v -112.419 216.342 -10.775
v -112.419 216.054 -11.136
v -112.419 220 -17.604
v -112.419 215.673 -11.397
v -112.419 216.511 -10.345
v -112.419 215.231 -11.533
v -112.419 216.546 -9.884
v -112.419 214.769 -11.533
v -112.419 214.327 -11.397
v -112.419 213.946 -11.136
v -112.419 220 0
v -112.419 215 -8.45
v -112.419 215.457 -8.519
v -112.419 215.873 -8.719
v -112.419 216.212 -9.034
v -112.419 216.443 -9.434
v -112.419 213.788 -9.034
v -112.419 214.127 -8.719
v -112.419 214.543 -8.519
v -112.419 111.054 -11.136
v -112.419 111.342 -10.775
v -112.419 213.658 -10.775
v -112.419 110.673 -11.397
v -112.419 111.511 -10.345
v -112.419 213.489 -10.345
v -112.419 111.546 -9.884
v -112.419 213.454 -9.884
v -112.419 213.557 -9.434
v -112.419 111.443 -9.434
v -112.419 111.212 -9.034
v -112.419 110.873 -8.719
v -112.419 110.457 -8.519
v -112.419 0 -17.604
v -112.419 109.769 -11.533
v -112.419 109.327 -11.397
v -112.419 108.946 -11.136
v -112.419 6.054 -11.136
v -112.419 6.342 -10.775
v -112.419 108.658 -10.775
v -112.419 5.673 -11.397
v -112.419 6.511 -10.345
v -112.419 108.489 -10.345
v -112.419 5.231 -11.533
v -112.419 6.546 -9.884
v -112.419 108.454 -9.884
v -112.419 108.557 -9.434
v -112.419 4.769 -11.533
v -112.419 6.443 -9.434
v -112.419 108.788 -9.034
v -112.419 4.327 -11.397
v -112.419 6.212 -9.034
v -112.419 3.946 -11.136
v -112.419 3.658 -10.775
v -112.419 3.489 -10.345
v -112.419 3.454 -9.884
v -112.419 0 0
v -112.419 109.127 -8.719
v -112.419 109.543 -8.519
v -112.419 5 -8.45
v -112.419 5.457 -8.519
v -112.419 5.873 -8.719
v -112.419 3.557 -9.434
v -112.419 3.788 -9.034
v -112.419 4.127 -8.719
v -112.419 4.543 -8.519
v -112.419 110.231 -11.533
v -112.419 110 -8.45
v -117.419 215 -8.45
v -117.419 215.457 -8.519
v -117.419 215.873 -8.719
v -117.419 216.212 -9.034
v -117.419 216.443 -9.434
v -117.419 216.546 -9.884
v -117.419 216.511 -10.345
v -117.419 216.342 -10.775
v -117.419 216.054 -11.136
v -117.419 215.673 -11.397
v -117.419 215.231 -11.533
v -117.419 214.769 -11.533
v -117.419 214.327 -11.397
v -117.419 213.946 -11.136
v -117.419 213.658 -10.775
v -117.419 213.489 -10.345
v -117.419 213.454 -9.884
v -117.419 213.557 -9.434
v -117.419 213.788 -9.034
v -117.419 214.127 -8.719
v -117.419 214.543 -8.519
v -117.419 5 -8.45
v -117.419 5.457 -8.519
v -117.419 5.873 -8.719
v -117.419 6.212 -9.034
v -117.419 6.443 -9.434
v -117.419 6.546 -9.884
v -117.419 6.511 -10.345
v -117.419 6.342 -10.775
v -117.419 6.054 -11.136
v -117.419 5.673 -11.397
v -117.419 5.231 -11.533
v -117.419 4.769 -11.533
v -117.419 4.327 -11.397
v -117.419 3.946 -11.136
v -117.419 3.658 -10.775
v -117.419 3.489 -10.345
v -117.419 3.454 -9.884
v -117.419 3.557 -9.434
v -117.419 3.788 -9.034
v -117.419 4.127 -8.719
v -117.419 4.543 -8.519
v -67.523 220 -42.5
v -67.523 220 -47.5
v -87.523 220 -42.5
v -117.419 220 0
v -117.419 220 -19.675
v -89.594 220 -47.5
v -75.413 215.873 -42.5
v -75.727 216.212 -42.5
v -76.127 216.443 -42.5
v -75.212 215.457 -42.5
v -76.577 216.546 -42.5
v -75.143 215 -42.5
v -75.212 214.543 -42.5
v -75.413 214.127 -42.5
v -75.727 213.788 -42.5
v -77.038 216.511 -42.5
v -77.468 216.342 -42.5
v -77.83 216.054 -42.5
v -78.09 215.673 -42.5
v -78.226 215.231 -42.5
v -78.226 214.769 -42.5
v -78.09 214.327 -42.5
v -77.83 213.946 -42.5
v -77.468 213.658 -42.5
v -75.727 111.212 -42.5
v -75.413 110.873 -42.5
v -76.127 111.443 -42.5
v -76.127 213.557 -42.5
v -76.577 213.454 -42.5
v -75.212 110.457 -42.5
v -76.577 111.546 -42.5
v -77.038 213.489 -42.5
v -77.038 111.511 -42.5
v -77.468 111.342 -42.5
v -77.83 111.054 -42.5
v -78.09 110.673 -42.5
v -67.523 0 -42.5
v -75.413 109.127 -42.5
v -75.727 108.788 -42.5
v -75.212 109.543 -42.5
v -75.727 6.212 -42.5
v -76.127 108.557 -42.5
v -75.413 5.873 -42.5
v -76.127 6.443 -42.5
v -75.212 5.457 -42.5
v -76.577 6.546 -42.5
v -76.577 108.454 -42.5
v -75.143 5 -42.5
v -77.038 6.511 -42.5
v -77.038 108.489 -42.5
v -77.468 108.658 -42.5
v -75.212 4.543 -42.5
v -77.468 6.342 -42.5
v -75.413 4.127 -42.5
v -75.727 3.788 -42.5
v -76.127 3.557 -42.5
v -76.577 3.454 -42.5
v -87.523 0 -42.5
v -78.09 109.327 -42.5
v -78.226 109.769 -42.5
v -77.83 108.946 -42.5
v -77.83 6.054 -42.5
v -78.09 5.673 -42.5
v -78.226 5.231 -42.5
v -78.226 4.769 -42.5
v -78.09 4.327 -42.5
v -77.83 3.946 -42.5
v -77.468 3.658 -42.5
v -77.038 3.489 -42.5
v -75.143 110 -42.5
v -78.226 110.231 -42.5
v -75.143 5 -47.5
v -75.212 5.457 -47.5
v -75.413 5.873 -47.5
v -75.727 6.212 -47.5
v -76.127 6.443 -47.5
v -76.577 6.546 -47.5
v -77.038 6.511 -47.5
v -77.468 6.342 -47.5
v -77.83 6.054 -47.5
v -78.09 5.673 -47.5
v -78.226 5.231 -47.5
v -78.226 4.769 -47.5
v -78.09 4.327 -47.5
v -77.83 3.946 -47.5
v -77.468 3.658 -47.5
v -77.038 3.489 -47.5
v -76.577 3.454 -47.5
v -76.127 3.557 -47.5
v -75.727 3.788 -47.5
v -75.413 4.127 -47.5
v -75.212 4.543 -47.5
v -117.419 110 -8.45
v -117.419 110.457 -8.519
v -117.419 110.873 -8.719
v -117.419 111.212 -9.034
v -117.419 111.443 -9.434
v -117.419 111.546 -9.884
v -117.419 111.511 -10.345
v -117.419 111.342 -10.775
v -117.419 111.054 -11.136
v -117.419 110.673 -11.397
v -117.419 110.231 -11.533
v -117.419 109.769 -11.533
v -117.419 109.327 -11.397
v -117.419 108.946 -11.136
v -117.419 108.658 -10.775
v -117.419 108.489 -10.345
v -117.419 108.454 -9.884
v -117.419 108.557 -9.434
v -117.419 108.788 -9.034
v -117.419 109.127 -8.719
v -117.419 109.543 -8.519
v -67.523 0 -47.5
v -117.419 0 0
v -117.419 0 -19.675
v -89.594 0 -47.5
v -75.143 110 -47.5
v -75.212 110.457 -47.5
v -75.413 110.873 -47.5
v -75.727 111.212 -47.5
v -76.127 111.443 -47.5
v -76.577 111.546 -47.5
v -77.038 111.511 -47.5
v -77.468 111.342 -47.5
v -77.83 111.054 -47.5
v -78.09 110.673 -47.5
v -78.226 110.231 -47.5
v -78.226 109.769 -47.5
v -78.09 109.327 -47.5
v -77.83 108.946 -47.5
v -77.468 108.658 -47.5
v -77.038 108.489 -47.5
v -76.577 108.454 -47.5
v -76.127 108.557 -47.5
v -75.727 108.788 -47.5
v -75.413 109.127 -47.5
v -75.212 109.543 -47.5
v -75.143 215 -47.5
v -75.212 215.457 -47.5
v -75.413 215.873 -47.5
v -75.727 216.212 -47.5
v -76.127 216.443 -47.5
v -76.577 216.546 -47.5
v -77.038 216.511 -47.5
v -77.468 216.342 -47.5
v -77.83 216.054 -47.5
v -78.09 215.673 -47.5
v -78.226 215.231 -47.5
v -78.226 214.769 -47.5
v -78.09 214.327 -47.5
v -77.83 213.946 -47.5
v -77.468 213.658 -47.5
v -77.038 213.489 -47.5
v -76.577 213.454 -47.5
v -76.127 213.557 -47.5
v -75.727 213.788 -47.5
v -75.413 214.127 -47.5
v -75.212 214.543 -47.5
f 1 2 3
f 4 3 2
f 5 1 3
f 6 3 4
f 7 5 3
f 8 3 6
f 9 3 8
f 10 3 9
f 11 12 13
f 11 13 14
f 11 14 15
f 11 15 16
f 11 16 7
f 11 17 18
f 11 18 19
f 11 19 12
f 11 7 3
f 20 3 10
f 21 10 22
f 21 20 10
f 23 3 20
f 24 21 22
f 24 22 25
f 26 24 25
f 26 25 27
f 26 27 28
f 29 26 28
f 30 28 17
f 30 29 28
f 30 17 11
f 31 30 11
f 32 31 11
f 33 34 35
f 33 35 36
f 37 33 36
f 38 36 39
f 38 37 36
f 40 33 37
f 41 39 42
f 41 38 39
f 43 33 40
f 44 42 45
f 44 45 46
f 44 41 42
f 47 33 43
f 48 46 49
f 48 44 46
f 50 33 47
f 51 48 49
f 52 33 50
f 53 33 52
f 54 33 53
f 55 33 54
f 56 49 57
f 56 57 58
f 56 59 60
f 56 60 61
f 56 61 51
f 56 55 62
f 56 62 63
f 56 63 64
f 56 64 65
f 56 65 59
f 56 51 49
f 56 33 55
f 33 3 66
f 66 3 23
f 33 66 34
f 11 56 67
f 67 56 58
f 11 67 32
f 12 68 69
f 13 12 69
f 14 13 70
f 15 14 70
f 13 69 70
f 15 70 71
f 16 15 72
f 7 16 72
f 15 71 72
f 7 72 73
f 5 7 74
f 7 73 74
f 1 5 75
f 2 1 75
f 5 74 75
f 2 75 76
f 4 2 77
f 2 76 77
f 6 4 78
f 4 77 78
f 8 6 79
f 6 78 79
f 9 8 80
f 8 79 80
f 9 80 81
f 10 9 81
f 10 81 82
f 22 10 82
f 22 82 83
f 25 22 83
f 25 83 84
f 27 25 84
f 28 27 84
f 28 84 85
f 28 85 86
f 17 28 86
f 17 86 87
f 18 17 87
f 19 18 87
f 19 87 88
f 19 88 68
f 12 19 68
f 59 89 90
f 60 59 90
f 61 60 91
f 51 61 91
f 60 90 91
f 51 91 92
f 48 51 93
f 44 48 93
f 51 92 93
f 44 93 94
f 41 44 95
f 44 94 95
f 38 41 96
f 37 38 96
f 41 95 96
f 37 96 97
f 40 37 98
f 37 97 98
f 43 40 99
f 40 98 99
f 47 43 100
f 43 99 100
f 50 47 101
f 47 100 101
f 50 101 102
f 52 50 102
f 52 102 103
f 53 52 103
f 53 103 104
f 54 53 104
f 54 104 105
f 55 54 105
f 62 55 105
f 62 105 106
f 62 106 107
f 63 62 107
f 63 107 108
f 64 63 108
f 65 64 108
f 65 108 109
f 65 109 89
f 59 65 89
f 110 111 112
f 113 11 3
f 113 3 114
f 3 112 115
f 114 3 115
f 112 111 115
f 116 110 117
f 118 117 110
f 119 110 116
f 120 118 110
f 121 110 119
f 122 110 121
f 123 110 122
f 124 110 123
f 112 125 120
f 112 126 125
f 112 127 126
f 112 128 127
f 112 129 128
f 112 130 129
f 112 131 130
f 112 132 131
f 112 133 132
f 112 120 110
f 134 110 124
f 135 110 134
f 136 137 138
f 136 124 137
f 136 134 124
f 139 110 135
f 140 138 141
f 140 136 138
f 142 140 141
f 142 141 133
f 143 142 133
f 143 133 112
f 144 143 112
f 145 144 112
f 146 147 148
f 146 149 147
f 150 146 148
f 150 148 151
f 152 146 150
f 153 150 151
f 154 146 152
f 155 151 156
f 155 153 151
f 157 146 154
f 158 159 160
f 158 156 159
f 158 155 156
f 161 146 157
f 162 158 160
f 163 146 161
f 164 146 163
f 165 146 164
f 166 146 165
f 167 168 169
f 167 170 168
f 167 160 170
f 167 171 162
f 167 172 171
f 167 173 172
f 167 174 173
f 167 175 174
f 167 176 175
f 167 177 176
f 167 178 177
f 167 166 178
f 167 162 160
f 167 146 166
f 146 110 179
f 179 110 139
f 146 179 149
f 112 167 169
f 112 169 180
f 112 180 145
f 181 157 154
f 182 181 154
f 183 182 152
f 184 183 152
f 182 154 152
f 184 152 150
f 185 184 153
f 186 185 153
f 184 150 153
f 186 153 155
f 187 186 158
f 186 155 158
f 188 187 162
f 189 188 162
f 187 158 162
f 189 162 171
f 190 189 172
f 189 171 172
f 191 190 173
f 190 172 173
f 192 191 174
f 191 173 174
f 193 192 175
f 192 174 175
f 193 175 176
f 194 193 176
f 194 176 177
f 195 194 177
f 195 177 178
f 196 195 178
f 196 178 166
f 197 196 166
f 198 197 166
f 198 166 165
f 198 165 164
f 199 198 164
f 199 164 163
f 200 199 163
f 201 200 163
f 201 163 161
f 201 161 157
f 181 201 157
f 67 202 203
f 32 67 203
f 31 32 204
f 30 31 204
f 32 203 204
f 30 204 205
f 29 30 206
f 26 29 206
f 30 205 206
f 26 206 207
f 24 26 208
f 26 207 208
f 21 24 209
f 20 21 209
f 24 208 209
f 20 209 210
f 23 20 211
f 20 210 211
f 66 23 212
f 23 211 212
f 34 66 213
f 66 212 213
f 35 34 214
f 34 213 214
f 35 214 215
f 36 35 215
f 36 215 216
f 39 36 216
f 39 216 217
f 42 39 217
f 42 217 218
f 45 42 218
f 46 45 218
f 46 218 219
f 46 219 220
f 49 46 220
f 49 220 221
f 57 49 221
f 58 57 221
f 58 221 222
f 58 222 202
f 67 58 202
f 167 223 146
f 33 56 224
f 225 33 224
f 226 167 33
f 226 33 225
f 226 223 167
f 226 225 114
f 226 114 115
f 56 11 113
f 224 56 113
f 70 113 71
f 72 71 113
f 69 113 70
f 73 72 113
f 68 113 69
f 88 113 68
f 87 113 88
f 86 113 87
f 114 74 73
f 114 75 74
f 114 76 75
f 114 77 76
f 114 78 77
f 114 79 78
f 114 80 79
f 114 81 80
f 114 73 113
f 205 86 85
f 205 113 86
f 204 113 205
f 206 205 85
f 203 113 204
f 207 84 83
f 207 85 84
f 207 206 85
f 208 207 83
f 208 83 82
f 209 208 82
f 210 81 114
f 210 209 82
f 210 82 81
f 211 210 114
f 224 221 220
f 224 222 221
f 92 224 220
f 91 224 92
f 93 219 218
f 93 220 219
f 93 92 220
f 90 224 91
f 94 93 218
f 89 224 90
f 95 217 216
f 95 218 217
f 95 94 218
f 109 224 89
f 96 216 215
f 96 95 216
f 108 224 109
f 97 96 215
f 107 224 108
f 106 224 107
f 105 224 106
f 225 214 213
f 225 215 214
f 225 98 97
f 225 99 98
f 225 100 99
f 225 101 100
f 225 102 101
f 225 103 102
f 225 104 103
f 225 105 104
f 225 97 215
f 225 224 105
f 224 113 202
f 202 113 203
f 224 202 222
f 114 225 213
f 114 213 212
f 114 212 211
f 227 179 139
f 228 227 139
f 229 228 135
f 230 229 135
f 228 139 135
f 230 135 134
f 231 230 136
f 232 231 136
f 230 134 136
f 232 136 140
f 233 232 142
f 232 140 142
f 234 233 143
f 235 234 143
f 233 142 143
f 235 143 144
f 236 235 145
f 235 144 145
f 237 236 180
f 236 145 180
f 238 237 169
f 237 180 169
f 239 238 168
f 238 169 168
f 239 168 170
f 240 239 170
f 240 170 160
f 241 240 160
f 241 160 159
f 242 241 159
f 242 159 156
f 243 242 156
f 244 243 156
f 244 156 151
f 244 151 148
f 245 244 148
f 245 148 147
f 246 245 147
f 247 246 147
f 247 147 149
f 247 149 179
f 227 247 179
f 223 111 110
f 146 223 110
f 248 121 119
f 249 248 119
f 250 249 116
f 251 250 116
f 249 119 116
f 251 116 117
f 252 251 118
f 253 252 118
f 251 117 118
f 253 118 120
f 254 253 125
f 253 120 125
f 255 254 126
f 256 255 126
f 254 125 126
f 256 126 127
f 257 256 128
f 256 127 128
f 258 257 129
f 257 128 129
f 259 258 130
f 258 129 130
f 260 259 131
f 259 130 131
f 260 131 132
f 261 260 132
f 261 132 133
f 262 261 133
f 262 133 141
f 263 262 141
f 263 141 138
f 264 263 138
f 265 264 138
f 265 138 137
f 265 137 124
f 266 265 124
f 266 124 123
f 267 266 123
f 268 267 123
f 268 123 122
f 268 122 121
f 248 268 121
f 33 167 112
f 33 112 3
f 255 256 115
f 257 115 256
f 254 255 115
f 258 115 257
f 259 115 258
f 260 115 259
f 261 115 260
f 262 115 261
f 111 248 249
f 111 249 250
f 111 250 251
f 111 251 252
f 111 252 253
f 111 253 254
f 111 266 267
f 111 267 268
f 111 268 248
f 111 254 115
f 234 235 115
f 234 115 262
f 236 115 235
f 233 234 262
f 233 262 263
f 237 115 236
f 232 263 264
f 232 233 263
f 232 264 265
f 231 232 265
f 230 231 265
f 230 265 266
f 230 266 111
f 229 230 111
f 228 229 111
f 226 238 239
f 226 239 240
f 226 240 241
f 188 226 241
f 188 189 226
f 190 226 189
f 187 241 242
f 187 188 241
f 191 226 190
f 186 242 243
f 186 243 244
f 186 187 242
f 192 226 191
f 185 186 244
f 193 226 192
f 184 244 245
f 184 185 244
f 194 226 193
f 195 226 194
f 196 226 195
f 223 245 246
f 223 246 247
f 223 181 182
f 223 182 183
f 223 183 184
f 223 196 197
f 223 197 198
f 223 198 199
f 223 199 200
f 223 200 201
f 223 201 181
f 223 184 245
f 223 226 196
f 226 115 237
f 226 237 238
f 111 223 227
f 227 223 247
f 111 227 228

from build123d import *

# Parameters (mm, degrees)
EXTRUDE_1_DEPTH          = 220
SKETCH_3_R               = 1.55
CUT_EXTRUDE_1_DEPTH      = 10
CUT_EXTRUDE_2_DEPTH      = 120
CUT_EXTRUDE_2_DEPTH_BACK = 10
SKETCH_4_R               = 1.55


with BuildPart() as part:
    # 草图2 → 凸台-拉伸1 (new body)
    with BuildSketch(Plane(origin=(0, 0, 0), x_dir=(1, 0, 0), z_dir=(0, 1, 0))):
        Polygon((-87.523326774, 42.5), (-112.419250373, 17.604076401), (-112.419250373, 0), (-117.419250373, 0), (-117.419250373, 19.675144213), (-89.594394586, 47.5), (-67.523326774, 47.5), (-67.523326774, 42.5), align=None)
    extrude(amount=EXTRUDE_1_DEPTH)

    # 草图3 → 切除-拉伸1 (cut)
    with BuildSketch(Plane.ZY.offset(117.419250373)):
        with Locations((-10, 110)):
            Circle(SKETCH_3_R)
        with Locations((-10, 5)):
            Circle(SKETCH_3_R)
        with Locations((-10, 215)):
            Circle(SKETCH_3_R)
    extrude(amount=-CUT_EXTRUDE_1_DEPTH, mode=Mode.SUBTRACT)

    # 草图4 → 切除-拉伸2 (cut, two sides: drawn at the far end of the back side and taken through both)
    with BuildSketch(Plane.XY.offset(-42.5).offset(-CUT_EXTRUDE_2_DEPTH_BACK)):
        with Locations((-76.693326774, 110)):
            Circle(SKETCH_4_R)
        with Locations((-76.693326774, 5)):
            Circle(SKETCH_4_R)
        with Locations((-76.693326774, 215)):
            Circle(SKETCH_4_R)
    extrude(amount=CUT_EXTRUDE_2_DEPTH + CUT_EXTRUDE_2_DEPTH_BACK, mode=Mode.SUBTRACT)


solid = part.part
